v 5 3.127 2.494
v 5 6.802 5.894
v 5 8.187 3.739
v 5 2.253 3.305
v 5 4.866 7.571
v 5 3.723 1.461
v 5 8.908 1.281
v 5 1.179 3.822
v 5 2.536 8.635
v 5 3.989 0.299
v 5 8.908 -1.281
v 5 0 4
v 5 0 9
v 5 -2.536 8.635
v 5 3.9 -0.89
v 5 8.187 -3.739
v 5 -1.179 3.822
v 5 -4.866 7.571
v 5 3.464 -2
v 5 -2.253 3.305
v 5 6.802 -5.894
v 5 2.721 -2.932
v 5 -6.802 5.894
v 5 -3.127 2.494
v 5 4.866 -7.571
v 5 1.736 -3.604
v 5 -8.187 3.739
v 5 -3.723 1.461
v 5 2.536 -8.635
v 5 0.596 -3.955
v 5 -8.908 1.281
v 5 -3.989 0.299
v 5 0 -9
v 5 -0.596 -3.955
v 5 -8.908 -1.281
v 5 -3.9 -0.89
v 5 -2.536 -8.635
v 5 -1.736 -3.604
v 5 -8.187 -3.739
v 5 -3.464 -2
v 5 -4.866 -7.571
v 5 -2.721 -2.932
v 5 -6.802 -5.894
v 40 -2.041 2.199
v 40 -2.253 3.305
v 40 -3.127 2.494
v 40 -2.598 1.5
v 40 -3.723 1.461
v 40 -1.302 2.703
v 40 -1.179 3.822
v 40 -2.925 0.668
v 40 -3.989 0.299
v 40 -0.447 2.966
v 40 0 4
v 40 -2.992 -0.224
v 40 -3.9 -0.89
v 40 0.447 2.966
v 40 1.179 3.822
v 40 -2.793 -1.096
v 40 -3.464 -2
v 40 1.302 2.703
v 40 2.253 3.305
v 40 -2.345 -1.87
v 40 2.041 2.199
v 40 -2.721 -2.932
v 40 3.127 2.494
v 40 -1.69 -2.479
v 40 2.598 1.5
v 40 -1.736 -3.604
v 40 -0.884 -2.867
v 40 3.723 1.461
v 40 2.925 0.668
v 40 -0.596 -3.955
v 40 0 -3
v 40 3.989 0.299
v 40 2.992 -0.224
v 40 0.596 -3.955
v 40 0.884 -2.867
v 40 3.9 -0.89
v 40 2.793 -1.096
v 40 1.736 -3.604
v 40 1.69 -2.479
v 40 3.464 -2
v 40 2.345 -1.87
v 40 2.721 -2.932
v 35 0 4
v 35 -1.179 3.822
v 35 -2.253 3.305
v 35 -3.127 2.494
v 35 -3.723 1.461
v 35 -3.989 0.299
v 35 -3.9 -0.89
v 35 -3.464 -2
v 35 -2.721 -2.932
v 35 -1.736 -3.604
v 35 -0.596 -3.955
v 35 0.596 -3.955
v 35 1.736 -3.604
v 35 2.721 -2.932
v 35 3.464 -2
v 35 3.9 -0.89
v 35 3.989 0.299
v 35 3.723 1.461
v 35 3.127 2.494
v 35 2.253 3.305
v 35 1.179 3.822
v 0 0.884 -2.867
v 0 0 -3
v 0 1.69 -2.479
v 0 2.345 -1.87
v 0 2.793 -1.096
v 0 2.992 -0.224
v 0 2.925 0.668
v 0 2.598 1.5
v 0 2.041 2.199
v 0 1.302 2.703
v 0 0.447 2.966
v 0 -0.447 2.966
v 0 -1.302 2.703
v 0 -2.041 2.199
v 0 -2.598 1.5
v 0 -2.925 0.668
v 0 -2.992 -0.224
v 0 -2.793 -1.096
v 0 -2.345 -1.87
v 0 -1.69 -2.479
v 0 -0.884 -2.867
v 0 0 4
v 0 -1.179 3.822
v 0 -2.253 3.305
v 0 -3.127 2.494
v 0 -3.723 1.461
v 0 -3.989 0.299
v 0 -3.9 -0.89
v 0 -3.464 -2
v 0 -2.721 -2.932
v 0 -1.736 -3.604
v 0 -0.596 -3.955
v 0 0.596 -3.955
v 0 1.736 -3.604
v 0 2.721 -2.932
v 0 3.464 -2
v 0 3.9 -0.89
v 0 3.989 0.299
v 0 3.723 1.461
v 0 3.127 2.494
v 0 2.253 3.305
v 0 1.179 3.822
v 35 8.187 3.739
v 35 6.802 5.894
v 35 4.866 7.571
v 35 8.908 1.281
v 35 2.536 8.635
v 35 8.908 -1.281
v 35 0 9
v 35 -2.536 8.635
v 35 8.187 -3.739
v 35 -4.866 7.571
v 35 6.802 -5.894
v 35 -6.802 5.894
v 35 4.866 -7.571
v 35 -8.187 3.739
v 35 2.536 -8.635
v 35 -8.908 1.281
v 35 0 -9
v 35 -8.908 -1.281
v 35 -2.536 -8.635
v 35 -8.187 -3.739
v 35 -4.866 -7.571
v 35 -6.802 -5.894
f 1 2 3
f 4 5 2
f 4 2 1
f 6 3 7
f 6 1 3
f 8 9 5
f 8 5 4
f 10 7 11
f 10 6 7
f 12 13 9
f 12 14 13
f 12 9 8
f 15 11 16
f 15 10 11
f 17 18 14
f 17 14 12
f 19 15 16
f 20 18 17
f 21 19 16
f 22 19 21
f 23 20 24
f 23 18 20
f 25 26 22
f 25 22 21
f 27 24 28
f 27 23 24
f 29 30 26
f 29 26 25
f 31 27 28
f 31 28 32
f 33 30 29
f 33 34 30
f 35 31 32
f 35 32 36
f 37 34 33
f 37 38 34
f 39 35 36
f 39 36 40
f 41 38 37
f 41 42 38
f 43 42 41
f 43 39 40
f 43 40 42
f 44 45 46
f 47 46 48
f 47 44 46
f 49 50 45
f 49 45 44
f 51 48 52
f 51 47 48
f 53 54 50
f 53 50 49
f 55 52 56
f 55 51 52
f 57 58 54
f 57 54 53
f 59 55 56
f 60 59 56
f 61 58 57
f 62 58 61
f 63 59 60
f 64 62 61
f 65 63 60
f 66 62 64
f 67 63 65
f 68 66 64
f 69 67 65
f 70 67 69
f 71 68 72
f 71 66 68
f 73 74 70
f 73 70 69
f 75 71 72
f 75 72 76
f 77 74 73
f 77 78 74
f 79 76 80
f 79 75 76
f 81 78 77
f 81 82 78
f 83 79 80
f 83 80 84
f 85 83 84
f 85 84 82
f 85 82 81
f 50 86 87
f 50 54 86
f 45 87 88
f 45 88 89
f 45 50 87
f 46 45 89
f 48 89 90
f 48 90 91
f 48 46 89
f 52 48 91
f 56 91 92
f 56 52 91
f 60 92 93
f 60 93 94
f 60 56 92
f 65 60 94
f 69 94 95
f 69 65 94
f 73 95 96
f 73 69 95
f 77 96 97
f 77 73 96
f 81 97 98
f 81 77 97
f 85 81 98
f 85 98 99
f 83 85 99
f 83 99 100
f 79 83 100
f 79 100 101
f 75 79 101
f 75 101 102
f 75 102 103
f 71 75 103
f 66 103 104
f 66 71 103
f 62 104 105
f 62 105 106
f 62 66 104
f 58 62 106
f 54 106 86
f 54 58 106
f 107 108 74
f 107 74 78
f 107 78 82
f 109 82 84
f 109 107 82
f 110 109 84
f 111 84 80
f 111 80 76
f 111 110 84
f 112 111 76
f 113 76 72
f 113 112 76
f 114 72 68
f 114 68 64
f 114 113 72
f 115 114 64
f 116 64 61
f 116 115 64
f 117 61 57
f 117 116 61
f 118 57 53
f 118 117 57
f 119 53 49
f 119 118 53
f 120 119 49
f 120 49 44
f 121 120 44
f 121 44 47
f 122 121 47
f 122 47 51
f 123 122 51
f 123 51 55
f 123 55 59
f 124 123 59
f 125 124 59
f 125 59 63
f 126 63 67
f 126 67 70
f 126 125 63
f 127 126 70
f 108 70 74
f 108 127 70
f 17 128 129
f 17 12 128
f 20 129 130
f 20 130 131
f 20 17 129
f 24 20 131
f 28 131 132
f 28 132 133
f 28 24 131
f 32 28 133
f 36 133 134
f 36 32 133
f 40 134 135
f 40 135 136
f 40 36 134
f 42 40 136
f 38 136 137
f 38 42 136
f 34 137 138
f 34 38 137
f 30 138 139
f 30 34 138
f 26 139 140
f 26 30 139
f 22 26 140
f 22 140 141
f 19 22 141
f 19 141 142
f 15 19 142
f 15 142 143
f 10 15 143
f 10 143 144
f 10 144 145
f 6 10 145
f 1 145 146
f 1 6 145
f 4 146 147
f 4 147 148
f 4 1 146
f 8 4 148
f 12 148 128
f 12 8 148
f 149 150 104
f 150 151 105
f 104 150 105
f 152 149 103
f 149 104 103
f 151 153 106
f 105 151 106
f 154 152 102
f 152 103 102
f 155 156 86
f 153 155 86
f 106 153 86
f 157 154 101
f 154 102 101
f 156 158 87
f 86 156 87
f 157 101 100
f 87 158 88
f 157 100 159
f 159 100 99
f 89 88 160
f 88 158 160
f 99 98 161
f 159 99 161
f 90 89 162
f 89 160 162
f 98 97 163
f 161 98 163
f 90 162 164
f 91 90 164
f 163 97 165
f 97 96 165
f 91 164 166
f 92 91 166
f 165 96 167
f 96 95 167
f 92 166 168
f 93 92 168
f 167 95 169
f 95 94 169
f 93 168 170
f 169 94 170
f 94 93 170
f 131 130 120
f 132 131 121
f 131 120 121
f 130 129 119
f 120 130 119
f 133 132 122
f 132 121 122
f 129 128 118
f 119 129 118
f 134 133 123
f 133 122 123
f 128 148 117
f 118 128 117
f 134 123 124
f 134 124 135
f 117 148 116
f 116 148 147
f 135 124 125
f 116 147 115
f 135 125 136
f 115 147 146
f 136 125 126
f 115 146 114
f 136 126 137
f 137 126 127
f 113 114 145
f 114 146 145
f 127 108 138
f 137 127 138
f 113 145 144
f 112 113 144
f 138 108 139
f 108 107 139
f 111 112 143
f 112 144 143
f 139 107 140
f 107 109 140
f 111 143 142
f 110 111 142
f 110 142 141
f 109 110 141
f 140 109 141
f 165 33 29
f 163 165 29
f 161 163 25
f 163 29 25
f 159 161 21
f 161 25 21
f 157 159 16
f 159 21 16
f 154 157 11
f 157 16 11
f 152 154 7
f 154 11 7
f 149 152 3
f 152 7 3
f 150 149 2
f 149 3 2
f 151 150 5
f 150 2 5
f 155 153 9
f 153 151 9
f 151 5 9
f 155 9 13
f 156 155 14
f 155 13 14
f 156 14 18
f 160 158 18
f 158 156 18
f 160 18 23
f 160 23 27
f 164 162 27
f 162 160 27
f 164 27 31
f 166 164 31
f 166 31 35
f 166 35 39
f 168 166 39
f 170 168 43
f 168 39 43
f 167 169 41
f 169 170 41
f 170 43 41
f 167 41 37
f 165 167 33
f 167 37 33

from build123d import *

# Parameters (mm, degrees)
SKETCH1_R           = 9
SKETCH1_R_2         = 3
BOSS_EXTRUDE1_DEPTH = 40
SKETCH2_W           = 5
SKETCH2_H           = 5


with BuildPart() as part:
    # Sketch1 → Boss-Extrude1 (new body)
    with BuildSketch(Plane(origin=(0, 0, 0), x_dir=(0, 0, -1), z_dir=(1, 0, 0))):
        Circle(SKETCH1_R)
        Circle(SKETCH1_R_2, mode=Mode.SUBTRACT)
    extrude(amount=BOSS_EXTRUDE1_DEPTH)

    # Sketch2 → Cut-Revolve1 (revolve, cut)
    with BuildSketch(Plane.XY, mode=Mode.PRIVATE) as cut_revolve1_sk:
        with Locations((2.5, 6.5)):
            Rectangle(SKETCH2_W, SKETCH2_H)
        with Locations((37.5, 6.5)):
            Rectangle(SKETCH2_W, SKETCH2_H)
    revolve(cut_revolve1_sk.sketch.rotate(Axis((0, 0, 0), (1, 0, 0)), 90), axis=Axis((0, 0, 0), (1, 0, 0)), mode=Mode.SUBTRACT)


solid = part.part
